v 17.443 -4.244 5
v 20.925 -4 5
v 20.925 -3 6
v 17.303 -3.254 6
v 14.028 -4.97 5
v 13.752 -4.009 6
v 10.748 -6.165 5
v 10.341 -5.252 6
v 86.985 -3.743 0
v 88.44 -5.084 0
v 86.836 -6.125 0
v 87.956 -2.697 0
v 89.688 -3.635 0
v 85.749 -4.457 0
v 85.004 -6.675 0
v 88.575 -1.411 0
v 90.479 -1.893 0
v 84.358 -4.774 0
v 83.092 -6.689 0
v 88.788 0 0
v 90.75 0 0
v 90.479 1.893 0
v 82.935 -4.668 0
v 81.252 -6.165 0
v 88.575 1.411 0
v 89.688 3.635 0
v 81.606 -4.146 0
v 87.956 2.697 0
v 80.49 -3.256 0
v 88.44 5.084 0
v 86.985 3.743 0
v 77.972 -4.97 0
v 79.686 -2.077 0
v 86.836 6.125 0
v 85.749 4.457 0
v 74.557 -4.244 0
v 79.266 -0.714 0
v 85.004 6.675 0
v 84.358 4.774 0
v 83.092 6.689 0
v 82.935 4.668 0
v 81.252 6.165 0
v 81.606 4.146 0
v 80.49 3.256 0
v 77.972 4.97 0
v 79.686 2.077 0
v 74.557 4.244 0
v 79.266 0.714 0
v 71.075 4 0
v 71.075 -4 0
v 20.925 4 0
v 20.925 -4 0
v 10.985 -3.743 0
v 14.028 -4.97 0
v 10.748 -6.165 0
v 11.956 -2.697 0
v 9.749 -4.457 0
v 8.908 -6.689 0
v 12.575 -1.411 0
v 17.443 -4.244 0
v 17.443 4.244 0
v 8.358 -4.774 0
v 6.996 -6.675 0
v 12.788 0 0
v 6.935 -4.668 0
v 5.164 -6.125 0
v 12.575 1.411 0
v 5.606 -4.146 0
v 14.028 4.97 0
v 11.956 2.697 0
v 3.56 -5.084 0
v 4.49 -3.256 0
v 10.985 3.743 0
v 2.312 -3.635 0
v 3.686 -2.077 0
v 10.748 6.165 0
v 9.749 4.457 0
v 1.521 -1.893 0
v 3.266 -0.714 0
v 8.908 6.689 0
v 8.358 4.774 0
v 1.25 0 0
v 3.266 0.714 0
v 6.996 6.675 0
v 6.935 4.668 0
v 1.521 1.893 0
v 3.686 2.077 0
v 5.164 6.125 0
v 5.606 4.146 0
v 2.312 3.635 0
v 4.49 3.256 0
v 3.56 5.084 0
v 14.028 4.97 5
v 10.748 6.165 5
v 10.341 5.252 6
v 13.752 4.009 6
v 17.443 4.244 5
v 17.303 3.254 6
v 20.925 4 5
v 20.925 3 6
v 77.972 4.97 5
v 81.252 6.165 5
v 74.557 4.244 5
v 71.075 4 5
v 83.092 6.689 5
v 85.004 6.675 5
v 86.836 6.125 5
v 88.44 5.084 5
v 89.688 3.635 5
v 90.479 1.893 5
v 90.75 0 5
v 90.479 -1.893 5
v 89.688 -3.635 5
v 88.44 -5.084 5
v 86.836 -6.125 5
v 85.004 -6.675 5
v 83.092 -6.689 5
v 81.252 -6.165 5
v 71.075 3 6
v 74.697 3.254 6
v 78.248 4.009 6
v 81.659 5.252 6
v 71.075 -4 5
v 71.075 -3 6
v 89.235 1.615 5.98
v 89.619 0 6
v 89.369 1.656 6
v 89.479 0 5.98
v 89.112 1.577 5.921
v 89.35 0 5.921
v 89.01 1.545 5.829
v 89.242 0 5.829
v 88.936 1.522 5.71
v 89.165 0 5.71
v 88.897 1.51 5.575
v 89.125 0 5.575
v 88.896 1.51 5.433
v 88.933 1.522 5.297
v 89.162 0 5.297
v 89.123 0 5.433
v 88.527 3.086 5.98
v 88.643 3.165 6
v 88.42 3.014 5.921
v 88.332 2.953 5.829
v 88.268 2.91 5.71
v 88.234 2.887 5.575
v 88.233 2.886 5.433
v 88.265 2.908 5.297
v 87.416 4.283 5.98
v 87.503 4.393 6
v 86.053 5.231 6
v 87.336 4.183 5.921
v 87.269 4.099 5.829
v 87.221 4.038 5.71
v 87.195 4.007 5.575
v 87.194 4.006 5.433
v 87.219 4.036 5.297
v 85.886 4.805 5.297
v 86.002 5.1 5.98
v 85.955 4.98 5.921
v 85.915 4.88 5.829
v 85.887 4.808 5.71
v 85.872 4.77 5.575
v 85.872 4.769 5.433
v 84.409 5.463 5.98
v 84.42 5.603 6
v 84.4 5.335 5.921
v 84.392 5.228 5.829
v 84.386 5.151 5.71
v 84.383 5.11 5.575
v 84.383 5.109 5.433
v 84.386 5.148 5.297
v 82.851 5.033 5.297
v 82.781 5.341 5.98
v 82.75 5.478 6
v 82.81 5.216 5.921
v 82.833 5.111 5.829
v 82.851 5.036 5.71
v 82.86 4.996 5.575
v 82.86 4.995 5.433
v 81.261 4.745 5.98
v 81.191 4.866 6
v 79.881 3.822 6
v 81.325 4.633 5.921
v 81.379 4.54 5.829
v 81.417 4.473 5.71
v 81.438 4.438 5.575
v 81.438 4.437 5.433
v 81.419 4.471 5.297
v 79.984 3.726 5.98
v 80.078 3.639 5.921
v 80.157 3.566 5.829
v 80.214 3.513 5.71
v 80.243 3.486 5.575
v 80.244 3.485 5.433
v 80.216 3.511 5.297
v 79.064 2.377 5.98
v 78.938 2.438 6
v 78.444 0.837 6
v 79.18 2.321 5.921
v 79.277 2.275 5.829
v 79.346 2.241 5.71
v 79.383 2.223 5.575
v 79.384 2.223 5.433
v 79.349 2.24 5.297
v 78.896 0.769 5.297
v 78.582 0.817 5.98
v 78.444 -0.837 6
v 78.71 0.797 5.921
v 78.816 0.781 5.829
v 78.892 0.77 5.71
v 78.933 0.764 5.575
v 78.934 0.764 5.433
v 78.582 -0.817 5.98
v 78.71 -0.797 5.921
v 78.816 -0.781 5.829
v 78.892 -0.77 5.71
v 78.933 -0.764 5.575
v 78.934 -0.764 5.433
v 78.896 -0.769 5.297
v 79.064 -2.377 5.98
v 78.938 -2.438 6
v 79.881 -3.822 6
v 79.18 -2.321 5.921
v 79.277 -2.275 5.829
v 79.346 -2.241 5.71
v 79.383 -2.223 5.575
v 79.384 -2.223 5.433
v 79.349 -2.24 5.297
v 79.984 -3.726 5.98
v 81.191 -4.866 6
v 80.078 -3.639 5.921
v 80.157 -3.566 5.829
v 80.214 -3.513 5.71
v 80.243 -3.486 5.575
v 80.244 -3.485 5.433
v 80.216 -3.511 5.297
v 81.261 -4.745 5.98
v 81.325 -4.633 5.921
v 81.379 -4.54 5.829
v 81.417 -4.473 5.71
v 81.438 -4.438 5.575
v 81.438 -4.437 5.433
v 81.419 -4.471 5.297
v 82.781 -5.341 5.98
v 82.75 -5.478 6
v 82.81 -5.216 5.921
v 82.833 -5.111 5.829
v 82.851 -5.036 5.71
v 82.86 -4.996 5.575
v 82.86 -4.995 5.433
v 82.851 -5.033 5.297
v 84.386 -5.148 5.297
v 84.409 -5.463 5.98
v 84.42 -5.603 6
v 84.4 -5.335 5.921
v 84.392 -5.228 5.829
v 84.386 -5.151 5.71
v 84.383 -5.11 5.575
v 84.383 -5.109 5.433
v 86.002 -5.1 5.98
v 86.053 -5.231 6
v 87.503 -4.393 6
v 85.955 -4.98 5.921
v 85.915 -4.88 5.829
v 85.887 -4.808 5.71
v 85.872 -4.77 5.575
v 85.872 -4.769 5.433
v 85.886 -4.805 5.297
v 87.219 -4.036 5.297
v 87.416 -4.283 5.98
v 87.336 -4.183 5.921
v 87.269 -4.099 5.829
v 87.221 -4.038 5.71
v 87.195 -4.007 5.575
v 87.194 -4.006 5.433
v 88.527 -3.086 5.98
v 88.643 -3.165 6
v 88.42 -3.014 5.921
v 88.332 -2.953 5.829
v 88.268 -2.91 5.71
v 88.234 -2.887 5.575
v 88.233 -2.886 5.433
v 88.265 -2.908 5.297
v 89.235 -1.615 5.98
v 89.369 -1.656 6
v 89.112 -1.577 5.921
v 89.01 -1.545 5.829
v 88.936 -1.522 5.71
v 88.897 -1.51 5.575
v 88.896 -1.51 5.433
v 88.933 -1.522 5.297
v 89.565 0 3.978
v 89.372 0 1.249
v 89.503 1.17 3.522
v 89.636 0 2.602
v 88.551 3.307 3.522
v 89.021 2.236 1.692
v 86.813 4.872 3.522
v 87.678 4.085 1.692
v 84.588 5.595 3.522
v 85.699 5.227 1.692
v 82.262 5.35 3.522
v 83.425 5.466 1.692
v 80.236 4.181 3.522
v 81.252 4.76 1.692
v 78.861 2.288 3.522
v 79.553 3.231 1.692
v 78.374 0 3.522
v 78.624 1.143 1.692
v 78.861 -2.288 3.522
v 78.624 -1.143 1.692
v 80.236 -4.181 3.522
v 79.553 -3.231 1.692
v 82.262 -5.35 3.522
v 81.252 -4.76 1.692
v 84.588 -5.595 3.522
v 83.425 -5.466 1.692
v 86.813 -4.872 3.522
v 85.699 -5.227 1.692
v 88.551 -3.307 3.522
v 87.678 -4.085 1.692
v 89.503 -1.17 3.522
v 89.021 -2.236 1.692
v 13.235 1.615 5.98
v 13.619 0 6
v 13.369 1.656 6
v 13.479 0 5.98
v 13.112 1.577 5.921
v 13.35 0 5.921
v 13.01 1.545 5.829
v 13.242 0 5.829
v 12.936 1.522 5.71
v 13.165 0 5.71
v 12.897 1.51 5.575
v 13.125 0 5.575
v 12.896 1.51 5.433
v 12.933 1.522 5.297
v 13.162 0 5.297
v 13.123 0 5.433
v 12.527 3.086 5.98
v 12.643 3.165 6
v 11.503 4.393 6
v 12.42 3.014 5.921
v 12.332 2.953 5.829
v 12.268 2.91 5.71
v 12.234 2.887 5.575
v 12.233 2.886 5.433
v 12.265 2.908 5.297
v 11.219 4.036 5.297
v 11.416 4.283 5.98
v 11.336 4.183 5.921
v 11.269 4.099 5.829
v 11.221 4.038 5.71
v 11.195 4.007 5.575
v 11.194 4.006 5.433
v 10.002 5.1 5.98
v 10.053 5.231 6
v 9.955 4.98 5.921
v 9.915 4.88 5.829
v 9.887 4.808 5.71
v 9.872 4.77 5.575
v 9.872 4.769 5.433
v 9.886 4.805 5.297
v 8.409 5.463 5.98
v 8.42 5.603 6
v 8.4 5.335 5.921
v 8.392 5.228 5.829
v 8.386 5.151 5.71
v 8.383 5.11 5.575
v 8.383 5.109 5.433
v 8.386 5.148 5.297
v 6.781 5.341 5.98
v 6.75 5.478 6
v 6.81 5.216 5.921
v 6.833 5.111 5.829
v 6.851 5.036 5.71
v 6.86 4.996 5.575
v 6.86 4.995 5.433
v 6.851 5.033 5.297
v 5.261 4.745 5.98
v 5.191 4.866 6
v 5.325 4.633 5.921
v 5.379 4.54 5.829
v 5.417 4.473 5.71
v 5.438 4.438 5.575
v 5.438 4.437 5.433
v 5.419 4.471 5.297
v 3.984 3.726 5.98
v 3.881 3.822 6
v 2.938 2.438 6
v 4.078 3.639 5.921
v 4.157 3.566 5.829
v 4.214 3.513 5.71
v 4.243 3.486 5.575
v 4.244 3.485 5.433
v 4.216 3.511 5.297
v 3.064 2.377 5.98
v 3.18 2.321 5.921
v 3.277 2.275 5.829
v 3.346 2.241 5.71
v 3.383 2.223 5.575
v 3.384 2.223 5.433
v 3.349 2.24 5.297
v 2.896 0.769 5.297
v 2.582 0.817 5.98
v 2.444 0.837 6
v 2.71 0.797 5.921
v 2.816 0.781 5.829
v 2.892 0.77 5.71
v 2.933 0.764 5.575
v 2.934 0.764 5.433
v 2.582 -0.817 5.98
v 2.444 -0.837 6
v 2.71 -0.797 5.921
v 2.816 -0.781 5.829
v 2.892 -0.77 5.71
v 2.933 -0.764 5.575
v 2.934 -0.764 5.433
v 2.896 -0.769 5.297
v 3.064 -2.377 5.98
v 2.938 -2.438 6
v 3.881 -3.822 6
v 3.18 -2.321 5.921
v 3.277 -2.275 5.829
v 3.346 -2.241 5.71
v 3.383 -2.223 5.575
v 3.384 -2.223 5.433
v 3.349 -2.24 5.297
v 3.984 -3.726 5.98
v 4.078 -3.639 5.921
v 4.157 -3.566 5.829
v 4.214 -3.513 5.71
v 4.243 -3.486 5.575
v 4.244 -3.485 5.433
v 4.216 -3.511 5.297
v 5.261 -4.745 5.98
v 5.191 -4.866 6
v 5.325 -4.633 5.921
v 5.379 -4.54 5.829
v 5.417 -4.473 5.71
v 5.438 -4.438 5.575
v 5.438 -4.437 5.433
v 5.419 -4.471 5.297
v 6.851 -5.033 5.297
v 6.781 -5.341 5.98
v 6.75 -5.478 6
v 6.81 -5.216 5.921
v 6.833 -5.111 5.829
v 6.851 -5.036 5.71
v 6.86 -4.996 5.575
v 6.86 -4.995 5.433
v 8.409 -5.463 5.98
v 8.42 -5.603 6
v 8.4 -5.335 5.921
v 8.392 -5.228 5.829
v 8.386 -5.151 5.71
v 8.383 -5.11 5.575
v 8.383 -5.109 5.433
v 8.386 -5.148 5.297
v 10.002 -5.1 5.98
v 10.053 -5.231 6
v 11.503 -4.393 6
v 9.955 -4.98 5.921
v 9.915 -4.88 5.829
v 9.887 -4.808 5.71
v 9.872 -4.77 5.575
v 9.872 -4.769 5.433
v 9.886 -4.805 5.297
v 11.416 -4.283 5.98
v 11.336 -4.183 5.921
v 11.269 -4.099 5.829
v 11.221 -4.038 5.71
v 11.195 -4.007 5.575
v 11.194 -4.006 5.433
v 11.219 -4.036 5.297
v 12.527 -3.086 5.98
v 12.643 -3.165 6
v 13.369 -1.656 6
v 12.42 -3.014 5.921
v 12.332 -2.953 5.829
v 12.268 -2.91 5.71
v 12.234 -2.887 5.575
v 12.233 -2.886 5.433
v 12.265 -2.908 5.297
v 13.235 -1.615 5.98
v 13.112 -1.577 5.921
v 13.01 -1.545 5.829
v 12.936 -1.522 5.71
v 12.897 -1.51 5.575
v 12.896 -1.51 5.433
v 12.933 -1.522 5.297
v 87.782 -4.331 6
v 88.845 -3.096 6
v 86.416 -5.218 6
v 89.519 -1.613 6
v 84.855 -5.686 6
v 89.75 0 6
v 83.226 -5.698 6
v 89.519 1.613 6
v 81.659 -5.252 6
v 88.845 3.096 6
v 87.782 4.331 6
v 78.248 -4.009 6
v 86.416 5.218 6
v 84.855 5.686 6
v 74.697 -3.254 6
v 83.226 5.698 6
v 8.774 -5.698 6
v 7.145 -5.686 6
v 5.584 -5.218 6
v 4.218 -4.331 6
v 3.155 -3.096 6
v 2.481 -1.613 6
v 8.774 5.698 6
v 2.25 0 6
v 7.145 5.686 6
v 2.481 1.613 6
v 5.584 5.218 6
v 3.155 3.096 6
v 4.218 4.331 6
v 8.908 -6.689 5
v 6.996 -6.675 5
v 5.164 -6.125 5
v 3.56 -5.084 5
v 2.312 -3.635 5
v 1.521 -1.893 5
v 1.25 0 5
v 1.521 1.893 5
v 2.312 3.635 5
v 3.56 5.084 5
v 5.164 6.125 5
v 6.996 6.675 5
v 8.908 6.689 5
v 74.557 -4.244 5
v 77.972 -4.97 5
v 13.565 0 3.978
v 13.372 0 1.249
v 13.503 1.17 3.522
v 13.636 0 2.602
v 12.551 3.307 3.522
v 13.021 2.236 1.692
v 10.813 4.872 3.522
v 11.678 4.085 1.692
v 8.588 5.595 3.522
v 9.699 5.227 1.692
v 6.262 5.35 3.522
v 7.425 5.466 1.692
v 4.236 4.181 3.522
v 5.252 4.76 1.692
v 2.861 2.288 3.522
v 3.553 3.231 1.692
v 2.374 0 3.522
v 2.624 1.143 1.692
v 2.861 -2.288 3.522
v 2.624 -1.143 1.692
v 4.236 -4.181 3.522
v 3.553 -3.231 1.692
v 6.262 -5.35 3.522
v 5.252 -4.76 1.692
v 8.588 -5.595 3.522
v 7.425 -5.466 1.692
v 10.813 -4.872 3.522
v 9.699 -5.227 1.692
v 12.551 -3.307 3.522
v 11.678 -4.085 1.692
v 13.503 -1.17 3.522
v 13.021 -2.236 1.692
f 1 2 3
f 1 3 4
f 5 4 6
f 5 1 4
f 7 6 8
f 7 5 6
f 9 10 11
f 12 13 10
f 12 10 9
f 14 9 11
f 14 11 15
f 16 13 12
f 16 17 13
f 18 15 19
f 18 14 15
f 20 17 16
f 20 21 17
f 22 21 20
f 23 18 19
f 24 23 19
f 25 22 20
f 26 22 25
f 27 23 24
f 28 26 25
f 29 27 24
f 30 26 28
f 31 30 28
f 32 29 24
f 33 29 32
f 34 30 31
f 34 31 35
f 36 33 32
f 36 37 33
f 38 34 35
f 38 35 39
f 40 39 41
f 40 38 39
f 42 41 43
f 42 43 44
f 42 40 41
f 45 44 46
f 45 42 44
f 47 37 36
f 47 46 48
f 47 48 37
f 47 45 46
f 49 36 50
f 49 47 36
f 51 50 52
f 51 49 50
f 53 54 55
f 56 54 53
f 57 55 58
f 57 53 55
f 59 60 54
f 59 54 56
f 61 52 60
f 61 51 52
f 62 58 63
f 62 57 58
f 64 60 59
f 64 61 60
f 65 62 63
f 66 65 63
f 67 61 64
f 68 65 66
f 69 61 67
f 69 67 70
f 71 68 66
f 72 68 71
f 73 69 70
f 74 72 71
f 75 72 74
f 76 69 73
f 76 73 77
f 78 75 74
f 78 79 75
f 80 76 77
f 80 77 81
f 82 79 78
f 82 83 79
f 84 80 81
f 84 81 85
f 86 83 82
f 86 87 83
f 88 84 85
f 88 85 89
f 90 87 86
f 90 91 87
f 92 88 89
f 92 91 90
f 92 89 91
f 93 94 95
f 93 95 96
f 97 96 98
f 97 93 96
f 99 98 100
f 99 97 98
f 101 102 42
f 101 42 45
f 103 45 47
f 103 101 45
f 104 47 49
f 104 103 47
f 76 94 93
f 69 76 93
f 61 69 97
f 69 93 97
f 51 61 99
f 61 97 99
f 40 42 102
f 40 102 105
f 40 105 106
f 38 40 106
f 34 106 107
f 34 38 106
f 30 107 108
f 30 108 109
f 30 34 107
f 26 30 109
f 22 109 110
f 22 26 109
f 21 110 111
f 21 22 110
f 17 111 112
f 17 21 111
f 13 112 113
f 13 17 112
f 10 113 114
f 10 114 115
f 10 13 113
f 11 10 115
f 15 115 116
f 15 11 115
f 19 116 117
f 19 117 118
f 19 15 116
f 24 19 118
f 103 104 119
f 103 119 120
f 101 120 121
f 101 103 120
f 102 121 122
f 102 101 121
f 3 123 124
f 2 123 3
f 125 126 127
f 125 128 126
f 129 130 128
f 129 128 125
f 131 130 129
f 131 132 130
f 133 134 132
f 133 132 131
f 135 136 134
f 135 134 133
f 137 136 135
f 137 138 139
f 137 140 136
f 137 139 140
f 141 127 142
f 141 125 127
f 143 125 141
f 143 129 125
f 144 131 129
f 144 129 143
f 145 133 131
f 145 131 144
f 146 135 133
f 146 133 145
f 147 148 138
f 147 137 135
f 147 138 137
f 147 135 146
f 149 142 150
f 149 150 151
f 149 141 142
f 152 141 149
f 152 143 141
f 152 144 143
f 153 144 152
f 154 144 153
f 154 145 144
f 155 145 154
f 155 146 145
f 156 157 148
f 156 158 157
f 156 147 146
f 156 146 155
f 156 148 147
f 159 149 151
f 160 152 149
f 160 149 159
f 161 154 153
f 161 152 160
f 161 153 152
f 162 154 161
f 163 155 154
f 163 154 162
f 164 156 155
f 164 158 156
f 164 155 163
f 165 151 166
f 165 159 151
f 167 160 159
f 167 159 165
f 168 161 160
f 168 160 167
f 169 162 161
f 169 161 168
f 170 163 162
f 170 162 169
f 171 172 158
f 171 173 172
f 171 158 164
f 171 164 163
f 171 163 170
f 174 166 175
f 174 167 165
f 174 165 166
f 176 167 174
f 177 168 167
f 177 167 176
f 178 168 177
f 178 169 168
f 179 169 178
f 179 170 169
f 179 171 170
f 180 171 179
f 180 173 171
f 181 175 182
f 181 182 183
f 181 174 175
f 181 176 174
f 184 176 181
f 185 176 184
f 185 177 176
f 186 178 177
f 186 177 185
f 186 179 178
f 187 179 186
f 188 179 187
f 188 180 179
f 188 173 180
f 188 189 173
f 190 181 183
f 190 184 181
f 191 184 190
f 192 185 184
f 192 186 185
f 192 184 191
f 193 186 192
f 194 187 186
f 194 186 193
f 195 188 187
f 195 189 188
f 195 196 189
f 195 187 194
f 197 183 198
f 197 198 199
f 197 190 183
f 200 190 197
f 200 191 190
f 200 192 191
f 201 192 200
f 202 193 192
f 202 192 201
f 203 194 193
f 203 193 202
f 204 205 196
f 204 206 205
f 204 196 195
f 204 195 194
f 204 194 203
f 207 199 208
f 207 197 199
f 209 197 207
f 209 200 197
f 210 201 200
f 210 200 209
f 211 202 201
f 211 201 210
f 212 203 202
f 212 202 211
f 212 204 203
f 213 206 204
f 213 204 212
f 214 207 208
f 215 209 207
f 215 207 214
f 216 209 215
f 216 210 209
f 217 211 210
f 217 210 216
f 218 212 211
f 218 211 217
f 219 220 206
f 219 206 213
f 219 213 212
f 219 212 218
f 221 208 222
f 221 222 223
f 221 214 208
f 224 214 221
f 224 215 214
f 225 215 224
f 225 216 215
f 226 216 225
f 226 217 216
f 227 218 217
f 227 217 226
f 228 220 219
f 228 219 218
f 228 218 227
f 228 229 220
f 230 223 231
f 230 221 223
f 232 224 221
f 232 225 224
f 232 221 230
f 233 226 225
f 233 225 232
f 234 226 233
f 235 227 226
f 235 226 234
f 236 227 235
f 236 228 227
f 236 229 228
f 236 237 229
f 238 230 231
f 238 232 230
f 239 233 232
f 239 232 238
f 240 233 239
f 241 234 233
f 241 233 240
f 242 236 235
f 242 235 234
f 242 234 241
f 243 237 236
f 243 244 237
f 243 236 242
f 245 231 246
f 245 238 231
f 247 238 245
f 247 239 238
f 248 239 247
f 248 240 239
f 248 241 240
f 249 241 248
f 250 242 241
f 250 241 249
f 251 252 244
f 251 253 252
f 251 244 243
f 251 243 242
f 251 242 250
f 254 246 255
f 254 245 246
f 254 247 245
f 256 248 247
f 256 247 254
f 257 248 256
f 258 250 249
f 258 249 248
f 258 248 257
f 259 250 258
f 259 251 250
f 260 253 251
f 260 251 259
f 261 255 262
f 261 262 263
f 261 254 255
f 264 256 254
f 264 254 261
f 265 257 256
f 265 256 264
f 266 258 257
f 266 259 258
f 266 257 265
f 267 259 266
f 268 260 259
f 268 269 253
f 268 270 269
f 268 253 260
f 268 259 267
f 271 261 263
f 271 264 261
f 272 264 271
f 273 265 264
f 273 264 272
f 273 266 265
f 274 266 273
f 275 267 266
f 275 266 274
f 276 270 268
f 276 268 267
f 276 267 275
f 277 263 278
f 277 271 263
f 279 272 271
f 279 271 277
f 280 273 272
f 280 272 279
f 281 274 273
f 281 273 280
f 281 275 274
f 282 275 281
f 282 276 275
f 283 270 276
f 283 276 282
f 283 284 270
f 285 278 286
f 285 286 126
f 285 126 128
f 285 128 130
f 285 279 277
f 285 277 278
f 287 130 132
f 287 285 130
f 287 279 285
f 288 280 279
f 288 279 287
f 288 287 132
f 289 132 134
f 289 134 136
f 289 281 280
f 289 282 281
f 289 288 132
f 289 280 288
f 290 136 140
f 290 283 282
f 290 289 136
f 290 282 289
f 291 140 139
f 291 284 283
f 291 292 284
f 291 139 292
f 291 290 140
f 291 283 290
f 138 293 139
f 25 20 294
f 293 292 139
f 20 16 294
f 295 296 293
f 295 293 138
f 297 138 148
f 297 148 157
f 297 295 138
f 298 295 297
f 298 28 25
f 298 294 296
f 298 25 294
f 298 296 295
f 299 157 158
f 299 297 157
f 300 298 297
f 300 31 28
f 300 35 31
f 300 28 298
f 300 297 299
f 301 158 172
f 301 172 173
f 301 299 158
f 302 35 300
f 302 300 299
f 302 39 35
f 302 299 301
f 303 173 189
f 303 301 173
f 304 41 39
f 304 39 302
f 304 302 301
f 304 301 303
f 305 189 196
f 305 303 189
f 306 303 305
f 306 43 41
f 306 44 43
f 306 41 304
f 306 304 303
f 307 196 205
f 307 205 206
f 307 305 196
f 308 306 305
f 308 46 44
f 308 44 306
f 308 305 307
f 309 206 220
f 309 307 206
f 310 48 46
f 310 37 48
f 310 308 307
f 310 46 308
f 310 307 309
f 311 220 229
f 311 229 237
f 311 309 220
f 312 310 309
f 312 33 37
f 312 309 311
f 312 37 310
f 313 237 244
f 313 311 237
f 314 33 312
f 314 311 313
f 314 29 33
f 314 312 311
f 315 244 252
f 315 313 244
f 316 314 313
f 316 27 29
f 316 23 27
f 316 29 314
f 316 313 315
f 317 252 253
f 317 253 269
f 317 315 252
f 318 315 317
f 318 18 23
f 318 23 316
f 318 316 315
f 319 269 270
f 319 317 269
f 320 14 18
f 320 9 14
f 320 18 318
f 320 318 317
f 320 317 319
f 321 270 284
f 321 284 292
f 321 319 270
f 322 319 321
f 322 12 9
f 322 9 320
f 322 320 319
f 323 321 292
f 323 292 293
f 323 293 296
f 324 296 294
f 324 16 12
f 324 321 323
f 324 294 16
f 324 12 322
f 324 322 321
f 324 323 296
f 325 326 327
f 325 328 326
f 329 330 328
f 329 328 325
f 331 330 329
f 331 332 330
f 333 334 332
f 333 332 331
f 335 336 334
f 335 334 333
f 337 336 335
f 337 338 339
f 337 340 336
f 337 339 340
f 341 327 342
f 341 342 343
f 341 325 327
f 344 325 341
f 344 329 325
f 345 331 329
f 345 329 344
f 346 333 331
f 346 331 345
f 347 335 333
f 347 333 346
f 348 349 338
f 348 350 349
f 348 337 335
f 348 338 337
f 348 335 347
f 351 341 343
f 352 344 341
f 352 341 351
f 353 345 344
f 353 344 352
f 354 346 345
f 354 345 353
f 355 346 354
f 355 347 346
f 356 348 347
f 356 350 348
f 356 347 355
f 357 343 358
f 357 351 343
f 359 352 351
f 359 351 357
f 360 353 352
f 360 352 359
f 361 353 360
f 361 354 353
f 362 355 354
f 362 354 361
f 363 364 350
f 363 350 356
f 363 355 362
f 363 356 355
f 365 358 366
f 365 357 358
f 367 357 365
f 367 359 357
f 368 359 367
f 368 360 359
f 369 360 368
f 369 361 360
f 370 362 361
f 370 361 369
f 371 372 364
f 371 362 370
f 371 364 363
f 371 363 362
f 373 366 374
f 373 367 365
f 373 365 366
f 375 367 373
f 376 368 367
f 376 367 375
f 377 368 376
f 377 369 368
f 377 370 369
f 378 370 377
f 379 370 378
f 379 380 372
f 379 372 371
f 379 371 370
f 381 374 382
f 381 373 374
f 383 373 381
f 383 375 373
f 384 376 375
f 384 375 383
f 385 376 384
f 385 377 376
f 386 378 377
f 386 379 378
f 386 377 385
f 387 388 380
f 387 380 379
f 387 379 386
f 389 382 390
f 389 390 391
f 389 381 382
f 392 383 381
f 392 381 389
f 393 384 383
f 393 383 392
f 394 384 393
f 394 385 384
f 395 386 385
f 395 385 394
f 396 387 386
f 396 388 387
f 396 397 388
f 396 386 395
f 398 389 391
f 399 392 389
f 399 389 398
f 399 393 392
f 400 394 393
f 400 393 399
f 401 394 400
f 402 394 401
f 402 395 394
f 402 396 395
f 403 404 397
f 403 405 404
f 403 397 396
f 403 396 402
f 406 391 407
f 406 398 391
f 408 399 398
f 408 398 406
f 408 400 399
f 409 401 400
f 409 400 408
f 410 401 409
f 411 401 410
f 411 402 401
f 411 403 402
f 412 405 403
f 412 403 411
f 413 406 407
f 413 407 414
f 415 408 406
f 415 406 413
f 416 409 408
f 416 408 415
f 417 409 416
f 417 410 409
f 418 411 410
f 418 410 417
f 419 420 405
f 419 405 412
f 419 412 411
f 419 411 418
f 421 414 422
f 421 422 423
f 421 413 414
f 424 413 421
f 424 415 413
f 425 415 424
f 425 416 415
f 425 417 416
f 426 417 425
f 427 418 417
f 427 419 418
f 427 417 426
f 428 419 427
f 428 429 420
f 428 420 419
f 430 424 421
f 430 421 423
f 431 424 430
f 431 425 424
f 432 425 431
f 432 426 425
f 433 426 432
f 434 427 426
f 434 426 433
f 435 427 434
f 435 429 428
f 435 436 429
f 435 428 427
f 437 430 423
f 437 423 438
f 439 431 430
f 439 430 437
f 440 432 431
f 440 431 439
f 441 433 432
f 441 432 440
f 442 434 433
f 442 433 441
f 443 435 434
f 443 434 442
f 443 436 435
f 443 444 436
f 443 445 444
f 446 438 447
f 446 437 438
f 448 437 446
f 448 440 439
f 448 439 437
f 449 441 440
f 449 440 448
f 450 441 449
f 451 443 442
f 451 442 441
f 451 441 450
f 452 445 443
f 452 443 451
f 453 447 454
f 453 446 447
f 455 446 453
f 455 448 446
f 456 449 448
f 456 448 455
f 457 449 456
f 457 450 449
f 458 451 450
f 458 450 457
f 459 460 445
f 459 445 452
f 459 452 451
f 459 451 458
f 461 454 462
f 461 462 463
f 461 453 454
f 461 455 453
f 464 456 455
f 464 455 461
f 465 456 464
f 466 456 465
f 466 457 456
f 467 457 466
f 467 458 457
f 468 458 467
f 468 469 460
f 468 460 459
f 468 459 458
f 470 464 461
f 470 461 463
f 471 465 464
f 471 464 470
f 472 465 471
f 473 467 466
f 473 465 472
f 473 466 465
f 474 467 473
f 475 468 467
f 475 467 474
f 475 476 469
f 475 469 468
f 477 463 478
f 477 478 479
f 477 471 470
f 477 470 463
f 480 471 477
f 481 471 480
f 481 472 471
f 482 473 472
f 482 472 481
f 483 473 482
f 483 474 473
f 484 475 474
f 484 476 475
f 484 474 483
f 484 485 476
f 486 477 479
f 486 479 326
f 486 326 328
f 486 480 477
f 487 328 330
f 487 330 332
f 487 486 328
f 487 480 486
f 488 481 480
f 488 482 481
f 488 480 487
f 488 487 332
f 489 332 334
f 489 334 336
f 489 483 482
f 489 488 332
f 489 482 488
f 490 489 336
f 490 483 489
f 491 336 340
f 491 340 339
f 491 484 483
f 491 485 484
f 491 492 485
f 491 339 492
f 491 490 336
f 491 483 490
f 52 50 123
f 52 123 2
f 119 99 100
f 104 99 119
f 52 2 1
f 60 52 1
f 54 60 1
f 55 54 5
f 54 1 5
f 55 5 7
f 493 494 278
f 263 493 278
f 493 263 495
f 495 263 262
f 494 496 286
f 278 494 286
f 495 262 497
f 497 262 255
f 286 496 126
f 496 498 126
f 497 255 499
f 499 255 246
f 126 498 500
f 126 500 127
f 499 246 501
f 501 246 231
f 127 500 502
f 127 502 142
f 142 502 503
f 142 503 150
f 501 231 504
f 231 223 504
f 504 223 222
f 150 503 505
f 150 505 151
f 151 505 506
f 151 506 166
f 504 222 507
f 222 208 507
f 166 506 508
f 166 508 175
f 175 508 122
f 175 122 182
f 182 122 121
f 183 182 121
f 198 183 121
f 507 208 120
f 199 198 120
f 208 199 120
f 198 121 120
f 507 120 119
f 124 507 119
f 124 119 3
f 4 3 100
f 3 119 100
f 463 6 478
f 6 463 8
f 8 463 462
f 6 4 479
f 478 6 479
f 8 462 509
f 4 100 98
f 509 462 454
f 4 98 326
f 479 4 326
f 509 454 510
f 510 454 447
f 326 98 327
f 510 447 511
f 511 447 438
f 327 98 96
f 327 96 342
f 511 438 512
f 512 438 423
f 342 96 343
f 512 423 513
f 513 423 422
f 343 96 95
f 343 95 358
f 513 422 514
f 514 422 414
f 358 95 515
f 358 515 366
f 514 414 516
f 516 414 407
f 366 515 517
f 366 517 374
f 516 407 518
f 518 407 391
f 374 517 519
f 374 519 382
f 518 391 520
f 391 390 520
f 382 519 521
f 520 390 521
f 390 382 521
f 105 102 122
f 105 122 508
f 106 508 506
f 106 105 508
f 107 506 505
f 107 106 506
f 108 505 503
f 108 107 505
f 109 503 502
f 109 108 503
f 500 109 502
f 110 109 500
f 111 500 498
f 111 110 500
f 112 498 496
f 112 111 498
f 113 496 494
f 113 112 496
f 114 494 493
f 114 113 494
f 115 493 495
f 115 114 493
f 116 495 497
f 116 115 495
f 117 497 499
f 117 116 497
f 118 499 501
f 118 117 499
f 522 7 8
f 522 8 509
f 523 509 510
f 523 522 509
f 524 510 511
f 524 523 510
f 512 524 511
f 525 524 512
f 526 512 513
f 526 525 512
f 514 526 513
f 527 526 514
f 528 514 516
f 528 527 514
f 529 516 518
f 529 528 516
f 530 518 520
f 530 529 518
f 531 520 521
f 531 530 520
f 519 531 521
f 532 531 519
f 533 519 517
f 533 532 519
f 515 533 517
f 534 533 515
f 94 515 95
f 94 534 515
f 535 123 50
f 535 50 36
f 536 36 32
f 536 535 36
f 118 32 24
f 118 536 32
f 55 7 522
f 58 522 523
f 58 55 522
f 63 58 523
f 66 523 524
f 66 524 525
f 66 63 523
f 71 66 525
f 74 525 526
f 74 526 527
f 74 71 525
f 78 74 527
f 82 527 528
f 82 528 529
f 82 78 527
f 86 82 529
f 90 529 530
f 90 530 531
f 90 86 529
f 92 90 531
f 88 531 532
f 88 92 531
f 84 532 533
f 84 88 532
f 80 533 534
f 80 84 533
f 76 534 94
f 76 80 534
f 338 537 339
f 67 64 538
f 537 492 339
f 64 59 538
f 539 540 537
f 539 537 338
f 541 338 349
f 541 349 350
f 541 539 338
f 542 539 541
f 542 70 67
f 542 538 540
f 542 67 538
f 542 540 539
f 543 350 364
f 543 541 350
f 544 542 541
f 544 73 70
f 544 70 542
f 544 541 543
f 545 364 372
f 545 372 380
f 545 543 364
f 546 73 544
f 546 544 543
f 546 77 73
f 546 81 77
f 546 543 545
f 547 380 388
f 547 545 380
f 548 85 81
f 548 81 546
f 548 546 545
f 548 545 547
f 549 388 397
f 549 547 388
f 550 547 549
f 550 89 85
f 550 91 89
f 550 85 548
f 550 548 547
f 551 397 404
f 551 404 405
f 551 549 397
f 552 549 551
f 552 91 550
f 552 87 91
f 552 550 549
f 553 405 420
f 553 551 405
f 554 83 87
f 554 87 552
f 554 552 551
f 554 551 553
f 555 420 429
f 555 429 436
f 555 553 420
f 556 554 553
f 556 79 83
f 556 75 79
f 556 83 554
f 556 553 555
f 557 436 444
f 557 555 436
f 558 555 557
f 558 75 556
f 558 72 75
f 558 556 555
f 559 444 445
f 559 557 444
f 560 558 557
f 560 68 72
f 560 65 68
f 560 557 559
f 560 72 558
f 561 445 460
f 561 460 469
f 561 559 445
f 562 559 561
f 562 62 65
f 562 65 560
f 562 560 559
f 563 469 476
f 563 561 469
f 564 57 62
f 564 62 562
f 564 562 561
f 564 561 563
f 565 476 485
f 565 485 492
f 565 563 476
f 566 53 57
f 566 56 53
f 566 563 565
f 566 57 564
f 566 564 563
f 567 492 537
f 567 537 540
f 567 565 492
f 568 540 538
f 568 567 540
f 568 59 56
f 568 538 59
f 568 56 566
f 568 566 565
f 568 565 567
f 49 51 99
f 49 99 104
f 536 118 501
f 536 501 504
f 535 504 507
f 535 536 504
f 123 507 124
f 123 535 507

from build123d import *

# Parameters (mm, degrees)
BOSS_EXTRUDE2_DEPTH = 6
FILLET2_R           = 25
CHAMFER2_SIZE       = 1


with BuildPart() as part:
    # Sketch7 → Boss-Extrude2 (new body)
    with BuildSketch(Plane(origin=(0, 0, 0), x_dir=(-1, 0, 0), z_dir=(0, 0, -1))):
        with BuildLine():
            Line((-78.562859207, -4), (-13.437140793, -4))
            ThreePointArc((-13.437140793, -4), (-1.25, 0), (-13.437140793, 4))
            Line((-13.437140793, 4), (-78.562859207, 4))
            ThreePointArc((-78.562859207, 4), (-90.75, 0), (-78.562859207, -4))
        make_face()
    extrude(amount=-BOSS_EXTRUDE2_DEPTH)

    # Sketch10 → Cut-Revolve3 (revolve, cut)
    with BuildSketch(Plane(origin=(0, 0, 0), x_dir=(1, 0, 0), z_dir=(0, 1, 0))):
        with BuildLine():
            Line((88.787744772, 0), (84, 0))
            Line((84, 0), (84, -6))
            Line((84, -6), (89.618941181, -6))
            ThreePointArc((89.618941181, -6), (89.199640564, -5.772372891), (89.162116695, -5.296747967))
            ThreePointArc((89.162116695, -5.296747967), (89.635940078, -2.601654121), (88.787744772, 0))
        make_face()
    revolve(axis=Axis((84, 0, 0), (0, 0, 1)), mode=Mode.SUBTRACT)

    # Sketch13 → Cut-Revolve4 (revolve, cut)
    with BuildSketch(Plane(origin=(0, 0, 0), x_dir=(1, 0, 0), z_dir=(0, 1, 0))):
        with BuildLine():
            Line((12.787744772, 0), (8, 0))
            Line((8, 0), (8, -6))
            Line((8, -6), (13.618941181, -6))
            ThreePointArc((13.618941181, -6), (13.199640564, -5.772372891), (13.162116695, -5.296747967))
            ThreePointArc((13.162116695, -5.296747967), (13.635940078, -2.601654121), (12.787744772, 0))
        make_face()
    revolve(axis=Axis((8, 0, 0), (0, 0, 1)), mode=Mode.SUBTRACT)

    # Fillet2
    fillet2_edges = [part.edges().sort_by_distance(p)[0] for p in [
        (13.437140793, -4, 3),
        (78.562859207, -4, 3),
        (78.562859207, 4, 3),
        (13.437140793, 4, 3),
    ]]
    fillet(fillet2_edges, radius=FILLET2_R)

    # Chamfer2
    chamfer2_edges = [part.edges().sort_by_distance(p)[0] for p in [
        (46, 4, 6),
        (90.75, 0, 6),
        (46, -4, 6),
        (1.25, 0, 6),
        (76.277322741, 4.547329985, 6),
        (15.722677259, -4.547329985, 6),
        (76.277322741, -4.547329985, 6),
        (15.722677259, 4.547329985, 6),
    ]]
    chamfer(chamfer2_edges, length=CHAMFER2_SIZE)


solid = part.part
